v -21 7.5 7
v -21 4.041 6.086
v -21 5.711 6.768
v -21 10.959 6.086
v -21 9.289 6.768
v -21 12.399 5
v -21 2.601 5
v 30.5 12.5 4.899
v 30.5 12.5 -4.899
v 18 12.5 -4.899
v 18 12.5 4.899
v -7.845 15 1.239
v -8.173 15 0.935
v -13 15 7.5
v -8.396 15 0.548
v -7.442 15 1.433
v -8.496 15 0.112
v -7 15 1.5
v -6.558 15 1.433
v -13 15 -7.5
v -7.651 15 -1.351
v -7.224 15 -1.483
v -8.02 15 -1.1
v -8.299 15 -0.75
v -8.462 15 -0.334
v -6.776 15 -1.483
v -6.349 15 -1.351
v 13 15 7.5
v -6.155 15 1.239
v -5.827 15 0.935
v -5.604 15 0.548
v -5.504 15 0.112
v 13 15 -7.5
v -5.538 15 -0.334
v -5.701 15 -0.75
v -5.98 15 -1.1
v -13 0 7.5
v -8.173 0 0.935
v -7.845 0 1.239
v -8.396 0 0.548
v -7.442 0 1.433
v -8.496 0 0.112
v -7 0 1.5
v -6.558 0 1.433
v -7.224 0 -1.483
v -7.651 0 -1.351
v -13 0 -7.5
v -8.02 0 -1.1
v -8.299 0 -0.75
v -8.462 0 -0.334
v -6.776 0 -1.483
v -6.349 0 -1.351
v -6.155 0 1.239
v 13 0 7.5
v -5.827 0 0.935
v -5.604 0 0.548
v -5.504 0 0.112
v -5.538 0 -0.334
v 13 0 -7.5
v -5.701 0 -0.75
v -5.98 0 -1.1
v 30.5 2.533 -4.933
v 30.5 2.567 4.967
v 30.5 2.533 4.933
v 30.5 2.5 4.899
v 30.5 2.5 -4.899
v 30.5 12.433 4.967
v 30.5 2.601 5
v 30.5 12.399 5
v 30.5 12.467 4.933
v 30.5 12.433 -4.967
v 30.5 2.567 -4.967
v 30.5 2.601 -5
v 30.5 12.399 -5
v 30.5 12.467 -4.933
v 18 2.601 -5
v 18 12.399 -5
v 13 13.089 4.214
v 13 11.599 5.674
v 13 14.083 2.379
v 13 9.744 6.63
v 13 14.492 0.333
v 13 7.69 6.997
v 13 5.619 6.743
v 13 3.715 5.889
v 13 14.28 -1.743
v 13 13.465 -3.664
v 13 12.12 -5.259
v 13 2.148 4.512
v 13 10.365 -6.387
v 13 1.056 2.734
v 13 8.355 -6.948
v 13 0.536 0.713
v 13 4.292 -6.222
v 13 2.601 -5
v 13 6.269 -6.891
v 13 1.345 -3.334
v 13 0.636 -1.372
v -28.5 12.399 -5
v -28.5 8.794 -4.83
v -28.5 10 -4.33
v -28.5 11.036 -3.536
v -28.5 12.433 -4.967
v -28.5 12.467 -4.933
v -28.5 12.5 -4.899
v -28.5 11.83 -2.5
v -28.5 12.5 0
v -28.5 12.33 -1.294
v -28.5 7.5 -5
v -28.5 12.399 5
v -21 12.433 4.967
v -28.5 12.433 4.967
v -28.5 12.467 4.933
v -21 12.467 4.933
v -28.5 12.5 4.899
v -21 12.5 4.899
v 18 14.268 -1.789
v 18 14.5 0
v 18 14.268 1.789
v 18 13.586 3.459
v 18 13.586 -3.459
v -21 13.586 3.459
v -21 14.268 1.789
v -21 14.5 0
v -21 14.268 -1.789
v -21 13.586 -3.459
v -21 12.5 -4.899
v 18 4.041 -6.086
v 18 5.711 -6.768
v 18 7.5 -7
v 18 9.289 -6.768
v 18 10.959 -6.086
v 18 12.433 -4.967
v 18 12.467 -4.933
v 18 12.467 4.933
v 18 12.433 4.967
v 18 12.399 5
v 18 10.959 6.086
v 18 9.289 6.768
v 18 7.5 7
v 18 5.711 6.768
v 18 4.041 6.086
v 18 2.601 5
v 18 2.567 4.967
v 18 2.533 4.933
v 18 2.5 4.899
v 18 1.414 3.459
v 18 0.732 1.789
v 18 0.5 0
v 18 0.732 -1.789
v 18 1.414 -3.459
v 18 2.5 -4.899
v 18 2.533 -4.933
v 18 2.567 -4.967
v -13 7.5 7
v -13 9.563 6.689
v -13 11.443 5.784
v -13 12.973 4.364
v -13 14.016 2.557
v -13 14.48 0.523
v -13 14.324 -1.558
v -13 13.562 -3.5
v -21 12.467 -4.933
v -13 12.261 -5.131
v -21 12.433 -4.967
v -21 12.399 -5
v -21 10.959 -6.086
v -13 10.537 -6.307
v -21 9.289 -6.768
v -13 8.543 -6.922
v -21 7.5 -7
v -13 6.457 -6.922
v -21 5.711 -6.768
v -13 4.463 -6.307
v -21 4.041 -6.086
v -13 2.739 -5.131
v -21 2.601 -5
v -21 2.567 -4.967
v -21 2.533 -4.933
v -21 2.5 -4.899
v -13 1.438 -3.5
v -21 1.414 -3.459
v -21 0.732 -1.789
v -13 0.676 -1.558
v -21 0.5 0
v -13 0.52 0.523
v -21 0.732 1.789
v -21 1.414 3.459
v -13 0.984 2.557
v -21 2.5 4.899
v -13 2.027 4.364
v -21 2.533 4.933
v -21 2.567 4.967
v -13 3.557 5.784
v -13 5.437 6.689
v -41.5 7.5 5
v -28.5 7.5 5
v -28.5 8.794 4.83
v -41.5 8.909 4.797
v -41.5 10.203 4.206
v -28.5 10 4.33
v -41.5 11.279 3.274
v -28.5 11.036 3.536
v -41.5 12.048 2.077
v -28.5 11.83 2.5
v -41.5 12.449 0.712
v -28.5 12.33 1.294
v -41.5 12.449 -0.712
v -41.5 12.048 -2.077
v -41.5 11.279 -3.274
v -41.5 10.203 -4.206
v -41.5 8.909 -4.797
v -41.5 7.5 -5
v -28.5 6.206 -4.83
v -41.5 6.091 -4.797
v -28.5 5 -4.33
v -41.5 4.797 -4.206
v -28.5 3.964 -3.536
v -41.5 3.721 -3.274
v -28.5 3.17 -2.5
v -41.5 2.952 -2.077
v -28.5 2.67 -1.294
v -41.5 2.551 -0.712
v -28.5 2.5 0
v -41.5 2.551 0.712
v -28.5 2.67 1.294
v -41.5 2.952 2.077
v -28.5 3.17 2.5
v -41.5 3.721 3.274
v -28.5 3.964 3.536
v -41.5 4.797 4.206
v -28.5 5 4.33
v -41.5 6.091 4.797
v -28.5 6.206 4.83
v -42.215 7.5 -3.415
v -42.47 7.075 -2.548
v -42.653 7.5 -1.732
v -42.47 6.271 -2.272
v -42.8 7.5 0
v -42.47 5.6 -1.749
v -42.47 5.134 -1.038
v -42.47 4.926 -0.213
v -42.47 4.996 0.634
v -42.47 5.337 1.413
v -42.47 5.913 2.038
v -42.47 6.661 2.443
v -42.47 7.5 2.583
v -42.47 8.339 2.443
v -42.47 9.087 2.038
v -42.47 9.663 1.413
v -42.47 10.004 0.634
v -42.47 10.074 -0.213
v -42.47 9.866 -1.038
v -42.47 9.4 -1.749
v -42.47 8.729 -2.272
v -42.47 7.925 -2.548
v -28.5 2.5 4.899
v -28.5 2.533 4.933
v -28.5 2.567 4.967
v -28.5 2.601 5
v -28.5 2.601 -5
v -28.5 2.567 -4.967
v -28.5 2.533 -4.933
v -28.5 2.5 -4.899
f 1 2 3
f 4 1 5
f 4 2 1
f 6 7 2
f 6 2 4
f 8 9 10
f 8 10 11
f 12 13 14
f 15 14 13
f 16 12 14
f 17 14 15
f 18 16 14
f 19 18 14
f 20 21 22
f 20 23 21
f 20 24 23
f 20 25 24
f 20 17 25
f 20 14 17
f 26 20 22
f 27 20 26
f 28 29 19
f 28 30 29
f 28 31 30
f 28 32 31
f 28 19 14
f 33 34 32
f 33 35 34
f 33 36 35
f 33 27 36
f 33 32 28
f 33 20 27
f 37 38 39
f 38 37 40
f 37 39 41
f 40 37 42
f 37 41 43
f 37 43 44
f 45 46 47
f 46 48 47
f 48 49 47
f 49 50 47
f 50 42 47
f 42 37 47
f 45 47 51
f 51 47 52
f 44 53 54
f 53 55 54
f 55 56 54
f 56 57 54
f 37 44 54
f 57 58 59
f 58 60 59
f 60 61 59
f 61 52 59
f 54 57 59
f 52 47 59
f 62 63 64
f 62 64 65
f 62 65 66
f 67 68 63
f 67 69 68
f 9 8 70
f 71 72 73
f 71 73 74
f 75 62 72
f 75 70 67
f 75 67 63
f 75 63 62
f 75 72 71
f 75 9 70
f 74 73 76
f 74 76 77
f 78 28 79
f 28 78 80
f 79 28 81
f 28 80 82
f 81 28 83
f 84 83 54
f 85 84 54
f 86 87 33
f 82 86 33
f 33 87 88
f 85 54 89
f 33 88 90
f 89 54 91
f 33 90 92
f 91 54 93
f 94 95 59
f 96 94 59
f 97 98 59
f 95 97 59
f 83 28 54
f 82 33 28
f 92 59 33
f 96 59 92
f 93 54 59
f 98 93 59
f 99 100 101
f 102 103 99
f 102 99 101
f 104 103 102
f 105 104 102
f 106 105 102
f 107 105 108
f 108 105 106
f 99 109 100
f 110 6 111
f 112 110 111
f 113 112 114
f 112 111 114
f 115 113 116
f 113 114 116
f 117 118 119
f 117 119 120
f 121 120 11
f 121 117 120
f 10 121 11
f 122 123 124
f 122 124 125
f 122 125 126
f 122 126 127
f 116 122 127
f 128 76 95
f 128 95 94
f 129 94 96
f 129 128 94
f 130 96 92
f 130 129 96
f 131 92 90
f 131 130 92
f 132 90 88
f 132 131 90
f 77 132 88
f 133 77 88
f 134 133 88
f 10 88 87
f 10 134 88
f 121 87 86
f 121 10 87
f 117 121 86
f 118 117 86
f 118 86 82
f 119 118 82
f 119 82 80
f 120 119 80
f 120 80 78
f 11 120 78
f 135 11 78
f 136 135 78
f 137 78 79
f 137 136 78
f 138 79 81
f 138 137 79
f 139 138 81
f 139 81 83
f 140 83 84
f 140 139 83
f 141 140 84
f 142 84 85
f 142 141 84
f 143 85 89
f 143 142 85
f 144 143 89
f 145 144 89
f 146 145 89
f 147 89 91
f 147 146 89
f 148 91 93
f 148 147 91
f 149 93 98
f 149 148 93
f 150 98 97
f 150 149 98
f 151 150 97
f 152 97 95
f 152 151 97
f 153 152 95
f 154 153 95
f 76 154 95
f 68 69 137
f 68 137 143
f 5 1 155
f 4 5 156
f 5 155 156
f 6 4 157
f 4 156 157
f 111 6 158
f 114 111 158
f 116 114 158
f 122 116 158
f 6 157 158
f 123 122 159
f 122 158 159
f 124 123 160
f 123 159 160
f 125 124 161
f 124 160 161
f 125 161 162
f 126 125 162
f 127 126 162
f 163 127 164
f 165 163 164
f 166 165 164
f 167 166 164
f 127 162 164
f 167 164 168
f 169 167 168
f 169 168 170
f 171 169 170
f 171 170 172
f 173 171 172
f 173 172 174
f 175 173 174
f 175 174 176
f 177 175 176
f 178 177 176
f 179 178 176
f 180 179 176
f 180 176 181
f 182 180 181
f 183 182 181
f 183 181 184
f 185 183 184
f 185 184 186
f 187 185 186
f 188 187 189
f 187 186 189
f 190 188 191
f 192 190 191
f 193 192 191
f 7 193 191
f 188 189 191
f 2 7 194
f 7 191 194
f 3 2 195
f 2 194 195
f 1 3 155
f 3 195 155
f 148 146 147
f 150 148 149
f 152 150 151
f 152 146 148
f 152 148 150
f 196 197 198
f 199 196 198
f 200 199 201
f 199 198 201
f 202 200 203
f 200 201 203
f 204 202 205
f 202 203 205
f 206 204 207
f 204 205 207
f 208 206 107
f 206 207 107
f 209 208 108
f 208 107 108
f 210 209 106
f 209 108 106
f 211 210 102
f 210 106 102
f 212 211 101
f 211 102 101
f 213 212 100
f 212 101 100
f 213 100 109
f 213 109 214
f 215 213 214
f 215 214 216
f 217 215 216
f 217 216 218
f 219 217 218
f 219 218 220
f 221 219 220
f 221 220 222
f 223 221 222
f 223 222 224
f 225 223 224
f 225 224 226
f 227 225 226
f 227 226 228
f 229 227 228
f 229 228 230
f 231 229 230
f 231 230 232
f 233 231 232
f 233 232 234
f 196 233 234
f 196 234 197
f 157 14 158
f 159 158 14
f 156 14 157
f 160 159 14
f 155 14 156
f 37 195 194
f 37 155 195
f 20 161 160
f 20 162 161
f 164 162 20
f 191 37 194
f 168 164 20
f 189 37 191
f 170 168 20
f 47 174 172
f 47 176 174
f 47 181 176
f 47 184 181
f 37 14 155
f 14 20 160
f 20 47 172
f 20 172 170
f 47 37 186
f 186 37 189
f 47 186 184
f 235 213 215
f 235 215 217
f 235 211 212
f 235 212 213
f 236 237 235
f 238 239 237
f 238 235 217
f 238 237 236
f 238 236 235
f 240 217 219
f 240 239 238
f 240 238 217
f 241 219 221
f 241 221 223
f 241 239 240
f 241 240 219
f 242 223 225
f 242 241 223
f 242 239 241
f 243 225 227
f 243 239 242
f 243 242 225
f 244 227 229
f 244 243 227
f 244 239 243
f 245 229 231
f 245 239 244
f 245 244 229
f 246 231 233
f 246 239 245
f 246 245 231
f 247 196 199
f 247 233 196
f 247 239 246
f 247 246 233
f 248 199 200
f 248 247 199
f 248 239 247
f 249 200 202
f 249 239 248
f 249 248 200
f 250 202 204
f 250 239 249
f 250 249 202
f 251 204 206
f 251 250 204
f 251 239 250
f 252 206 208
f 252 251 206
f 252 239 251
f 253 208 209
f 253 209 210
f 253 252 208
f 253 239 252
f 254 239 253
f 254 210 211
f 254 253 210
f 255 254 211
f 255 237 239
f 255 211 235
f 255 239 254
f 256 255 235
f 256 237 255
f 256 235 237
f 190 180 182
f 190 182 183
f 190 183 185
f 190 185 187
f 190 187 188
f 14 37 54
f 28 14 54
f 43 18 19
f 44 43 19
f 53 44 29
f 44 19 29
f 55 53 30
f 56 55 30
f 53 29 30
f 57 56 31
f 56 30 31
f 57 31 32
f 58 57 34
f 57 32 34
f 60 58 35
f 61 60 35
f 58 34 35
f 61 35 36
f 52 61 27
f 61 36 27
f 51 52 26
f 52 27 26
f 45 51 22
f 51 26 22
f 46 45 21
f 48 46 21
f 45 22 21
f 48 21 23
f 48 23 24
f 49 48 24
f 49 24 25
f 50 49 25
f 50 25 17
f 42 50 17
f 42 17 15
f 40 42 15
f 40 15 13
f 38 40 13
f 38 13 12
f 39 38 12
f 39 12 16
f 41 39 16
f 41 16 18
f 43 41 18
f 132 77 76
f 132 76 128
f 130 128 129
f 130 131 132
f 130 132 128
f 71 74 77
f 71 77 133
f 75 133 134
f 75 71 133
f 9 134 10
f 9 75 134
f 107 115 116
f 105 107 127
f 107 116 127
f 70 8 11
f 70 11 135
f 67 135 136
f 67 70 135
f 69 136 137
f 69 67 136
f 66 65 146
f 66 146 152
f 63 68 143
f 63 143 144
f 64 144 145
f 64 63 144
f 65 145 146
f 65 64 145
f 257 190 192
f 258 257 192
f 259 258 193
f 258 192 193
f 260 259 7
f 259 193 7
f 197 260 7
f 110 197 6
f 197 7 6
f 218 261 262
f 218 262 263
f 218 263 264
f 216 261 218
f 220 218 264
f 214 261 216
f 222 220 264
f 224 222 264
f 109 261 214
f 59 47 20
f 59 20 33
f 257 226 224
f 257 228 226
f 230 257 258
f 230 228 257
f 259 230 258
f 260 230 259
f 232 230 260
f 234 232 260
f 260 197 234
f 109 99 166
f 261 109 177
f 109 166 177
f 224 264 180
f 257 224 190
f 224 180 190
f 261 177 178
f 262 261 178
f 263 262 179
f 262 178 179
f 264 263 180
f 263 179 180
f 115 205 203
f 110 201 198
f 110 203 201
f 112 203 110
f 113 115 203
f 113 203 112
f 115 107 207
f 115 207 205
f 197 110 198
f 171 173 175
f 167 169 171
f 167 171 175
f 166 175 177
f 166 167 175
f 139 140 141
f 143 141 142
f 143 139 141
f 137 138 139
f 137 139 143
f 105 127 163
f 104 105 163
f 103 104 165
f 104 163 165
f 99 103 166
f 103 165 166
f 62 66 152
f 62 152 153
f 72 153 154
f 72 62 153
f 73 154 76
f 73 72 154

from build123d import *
from build123d.topology import SkipClean

# Parameters (mm, degrees)
SKETCH1_W           = 26
SKETCH1_H           = 15
BOSS_EXTRUDE1_DEPTH = 15
SKETCH2_R           = 1.5
CUT_EXTRUDE1_DEPTH  = 22.219095174
SKETCH3_R           = 7
BOSS_EXTRUDE2_DEPTH = 8
BOSS_EXTRUDE3_DEPTH = 7.5
SKETCH5_R           = 5
BOSS_EXTRUDE4_DEPTH = 13
BOSS_EXTRUDE5_START = 5
SKETCH6_R           = 7
BOSS_EXTRUDE5_DEPTH = 5
BOSS_EXTRUDE6_START = 12.5
BOSS_EXTRUDE6_DEPTH = 12.5
DOME1_FACE_RADIUS   = 5
DOME1_HEIGHT        = 1.3


with BuildPart() as part:
    # Sketch1 → Boss-Extrude1 (new body)
    with BuildSketch(Plane(origin=(0, 0, 0), x_dir=(1, 0, 0), z_dir=(0, 1, 0))):
        Rectangle(SKETCH1_W, SKETCH1_H)
    extrude(amount=BOSS_EXTRUDE1_DEPTH)

    # Sketch2 → Cut-Extrude1 (cut, through all)
    with BuildSketch(Plane(origin=(0, 15, 0), x_dir=(1, 0, 0), z_dir=(0, 1, 0))):
        with Locations(Location((-7, 0, 0), (0, 0, 270))):
            Circle(SKETCH2_R)
    extrude(amount=-CUT_EXTRUDE1_DEPTH, mode=Mode.SUBTRACT)

    # Sketch3 → Boss-Extrude2 (add)
    with BuildSketch(Plane.ZY.offset(13)):
        with Locations((0, 7.5)):
            Circle(SKETCH3_R)
    extrude(amount=BOSS_EXTRUDE2_DEPTH)

    # Sketch4 → Boss-Extrude3 (add)
    with BuildSketch(Plane.ZY.offset(21)):
        with BuildLine():
            Line((4.898979486, 12.5), (-4.898979486, 12.5))
            ThreePointArc((-4.898979486, 12.5), (-4.949747468, 12.449747468), (-5, 12.398979486))
            Line((-5, 12.398979486), (-5, 2.601020514))
            ThreePointArc((-5, 2.601020514), (-4.949747468, 2.550252532), (-4.898979486, 2.5))
            Line((-4.898979486, 2.5), (4.898979486, 2.5))
            ThreePointArc((4.898979486, 2.5), (4.949747468, 2.550252532), (5, 2.601020514))
            Line((5, 2.601020514), (5, 12.398979486))
            ThreePointArc((5, 12.398979486), (4.949747468, 12.449747468), (4.898979486, 12.5))
        make_face()
    extrude(amount=BOSS_EXTRUDE3_DEPTH)

    # Sketch5 → Boss-Extrude4 (add)
    with BuildSketch(Plane.ZY.offset(28.5)):
        with Locations((0, 7.5)):
            Circle(SKETCH5_R)
    extrude(amount=BOSS_EXTRUDE4_DEPTH)

    # Sketch6 → Boss-Extrude5 (add)
    with BuildSketch(Plane(origin=(13, 0, 0), x_dir=(0, 0, -1), z_dir=(1, 0, 0)).offset(BOSS_EXTRUDE5_START)):
        with Locations(Location((0, 7.5, 0), (0, 0, 315.584691403))):
            Circle(SKETCH6_R)
    extrude(amount=-BOSS_EXTRUDE5_DEPTH)

    # Sketch7 → Boss-Extrude6 (add)
    with SkipClean():  # the faces are left unmerged after this step: merging them gives an invalid solid
        with BuildSketch(Plane(origin=(18, 0, 0), x_dir=(0, 0, -1), z_dir=(1, 0, 0)).offset(BOSS_EXTRUDE6_START)):
            with BuildLine():
                ThreePointArc((-5, 2.601020514), (-4.949747468, 2.550252532), (-4.898979486, 2.5))
                Line((-4.898979486, 2.5), (4.898979486, 2.5))
                ThreePointArc((4.898979486, 2.5), (4.949747468, 2.550252532), (5, 2.601020514))
                Line((5, 2.601020514), (5, 12.398979486))
                ThreePointArc((5, 12.398979486), (4.949747468, 12.449747468), (4.898979486, 12.5))
                Line((4.898979486, 12.5), (-4.898979486, 12.5))
                ThreePointArc((-4.898979486, 12.5), (-4.949747468, 12.449747468), (-5, 12.398979486))
                Line((-5, 12.398979486), (-5, 2.601020514))
            make_face()
        extrude(amount=-BOSS_EXTRUDE6_DEPTH)

    # Dome1: a dome of height H over a round flat face of radius A is a cap of a sphere of radius (A * A + H * H) / (2 * H)
    dome1_r = (DOME1_FACE_RADIUS * DOME1_FACE_RADIUS + DOME1_HEIGHT * DOME1_HEIGHT) / (2 * DOME1_HEIGHT)
    dome1_base = Plane((-41.5, 7.5, 0), z_dir=(-1, 0, 0))
    with Locations(dome1_base.offset(DOME1_HEIGHT - dome1_r)):
        dome1_ball = Sphere(dome1_r, mode=Mode.PRIVATE)
    add(split(dome1_ball, bisect_by=dome1_base, keep=Keep.TOP, mode=Mode.PRIVATE))


solid = part.part
